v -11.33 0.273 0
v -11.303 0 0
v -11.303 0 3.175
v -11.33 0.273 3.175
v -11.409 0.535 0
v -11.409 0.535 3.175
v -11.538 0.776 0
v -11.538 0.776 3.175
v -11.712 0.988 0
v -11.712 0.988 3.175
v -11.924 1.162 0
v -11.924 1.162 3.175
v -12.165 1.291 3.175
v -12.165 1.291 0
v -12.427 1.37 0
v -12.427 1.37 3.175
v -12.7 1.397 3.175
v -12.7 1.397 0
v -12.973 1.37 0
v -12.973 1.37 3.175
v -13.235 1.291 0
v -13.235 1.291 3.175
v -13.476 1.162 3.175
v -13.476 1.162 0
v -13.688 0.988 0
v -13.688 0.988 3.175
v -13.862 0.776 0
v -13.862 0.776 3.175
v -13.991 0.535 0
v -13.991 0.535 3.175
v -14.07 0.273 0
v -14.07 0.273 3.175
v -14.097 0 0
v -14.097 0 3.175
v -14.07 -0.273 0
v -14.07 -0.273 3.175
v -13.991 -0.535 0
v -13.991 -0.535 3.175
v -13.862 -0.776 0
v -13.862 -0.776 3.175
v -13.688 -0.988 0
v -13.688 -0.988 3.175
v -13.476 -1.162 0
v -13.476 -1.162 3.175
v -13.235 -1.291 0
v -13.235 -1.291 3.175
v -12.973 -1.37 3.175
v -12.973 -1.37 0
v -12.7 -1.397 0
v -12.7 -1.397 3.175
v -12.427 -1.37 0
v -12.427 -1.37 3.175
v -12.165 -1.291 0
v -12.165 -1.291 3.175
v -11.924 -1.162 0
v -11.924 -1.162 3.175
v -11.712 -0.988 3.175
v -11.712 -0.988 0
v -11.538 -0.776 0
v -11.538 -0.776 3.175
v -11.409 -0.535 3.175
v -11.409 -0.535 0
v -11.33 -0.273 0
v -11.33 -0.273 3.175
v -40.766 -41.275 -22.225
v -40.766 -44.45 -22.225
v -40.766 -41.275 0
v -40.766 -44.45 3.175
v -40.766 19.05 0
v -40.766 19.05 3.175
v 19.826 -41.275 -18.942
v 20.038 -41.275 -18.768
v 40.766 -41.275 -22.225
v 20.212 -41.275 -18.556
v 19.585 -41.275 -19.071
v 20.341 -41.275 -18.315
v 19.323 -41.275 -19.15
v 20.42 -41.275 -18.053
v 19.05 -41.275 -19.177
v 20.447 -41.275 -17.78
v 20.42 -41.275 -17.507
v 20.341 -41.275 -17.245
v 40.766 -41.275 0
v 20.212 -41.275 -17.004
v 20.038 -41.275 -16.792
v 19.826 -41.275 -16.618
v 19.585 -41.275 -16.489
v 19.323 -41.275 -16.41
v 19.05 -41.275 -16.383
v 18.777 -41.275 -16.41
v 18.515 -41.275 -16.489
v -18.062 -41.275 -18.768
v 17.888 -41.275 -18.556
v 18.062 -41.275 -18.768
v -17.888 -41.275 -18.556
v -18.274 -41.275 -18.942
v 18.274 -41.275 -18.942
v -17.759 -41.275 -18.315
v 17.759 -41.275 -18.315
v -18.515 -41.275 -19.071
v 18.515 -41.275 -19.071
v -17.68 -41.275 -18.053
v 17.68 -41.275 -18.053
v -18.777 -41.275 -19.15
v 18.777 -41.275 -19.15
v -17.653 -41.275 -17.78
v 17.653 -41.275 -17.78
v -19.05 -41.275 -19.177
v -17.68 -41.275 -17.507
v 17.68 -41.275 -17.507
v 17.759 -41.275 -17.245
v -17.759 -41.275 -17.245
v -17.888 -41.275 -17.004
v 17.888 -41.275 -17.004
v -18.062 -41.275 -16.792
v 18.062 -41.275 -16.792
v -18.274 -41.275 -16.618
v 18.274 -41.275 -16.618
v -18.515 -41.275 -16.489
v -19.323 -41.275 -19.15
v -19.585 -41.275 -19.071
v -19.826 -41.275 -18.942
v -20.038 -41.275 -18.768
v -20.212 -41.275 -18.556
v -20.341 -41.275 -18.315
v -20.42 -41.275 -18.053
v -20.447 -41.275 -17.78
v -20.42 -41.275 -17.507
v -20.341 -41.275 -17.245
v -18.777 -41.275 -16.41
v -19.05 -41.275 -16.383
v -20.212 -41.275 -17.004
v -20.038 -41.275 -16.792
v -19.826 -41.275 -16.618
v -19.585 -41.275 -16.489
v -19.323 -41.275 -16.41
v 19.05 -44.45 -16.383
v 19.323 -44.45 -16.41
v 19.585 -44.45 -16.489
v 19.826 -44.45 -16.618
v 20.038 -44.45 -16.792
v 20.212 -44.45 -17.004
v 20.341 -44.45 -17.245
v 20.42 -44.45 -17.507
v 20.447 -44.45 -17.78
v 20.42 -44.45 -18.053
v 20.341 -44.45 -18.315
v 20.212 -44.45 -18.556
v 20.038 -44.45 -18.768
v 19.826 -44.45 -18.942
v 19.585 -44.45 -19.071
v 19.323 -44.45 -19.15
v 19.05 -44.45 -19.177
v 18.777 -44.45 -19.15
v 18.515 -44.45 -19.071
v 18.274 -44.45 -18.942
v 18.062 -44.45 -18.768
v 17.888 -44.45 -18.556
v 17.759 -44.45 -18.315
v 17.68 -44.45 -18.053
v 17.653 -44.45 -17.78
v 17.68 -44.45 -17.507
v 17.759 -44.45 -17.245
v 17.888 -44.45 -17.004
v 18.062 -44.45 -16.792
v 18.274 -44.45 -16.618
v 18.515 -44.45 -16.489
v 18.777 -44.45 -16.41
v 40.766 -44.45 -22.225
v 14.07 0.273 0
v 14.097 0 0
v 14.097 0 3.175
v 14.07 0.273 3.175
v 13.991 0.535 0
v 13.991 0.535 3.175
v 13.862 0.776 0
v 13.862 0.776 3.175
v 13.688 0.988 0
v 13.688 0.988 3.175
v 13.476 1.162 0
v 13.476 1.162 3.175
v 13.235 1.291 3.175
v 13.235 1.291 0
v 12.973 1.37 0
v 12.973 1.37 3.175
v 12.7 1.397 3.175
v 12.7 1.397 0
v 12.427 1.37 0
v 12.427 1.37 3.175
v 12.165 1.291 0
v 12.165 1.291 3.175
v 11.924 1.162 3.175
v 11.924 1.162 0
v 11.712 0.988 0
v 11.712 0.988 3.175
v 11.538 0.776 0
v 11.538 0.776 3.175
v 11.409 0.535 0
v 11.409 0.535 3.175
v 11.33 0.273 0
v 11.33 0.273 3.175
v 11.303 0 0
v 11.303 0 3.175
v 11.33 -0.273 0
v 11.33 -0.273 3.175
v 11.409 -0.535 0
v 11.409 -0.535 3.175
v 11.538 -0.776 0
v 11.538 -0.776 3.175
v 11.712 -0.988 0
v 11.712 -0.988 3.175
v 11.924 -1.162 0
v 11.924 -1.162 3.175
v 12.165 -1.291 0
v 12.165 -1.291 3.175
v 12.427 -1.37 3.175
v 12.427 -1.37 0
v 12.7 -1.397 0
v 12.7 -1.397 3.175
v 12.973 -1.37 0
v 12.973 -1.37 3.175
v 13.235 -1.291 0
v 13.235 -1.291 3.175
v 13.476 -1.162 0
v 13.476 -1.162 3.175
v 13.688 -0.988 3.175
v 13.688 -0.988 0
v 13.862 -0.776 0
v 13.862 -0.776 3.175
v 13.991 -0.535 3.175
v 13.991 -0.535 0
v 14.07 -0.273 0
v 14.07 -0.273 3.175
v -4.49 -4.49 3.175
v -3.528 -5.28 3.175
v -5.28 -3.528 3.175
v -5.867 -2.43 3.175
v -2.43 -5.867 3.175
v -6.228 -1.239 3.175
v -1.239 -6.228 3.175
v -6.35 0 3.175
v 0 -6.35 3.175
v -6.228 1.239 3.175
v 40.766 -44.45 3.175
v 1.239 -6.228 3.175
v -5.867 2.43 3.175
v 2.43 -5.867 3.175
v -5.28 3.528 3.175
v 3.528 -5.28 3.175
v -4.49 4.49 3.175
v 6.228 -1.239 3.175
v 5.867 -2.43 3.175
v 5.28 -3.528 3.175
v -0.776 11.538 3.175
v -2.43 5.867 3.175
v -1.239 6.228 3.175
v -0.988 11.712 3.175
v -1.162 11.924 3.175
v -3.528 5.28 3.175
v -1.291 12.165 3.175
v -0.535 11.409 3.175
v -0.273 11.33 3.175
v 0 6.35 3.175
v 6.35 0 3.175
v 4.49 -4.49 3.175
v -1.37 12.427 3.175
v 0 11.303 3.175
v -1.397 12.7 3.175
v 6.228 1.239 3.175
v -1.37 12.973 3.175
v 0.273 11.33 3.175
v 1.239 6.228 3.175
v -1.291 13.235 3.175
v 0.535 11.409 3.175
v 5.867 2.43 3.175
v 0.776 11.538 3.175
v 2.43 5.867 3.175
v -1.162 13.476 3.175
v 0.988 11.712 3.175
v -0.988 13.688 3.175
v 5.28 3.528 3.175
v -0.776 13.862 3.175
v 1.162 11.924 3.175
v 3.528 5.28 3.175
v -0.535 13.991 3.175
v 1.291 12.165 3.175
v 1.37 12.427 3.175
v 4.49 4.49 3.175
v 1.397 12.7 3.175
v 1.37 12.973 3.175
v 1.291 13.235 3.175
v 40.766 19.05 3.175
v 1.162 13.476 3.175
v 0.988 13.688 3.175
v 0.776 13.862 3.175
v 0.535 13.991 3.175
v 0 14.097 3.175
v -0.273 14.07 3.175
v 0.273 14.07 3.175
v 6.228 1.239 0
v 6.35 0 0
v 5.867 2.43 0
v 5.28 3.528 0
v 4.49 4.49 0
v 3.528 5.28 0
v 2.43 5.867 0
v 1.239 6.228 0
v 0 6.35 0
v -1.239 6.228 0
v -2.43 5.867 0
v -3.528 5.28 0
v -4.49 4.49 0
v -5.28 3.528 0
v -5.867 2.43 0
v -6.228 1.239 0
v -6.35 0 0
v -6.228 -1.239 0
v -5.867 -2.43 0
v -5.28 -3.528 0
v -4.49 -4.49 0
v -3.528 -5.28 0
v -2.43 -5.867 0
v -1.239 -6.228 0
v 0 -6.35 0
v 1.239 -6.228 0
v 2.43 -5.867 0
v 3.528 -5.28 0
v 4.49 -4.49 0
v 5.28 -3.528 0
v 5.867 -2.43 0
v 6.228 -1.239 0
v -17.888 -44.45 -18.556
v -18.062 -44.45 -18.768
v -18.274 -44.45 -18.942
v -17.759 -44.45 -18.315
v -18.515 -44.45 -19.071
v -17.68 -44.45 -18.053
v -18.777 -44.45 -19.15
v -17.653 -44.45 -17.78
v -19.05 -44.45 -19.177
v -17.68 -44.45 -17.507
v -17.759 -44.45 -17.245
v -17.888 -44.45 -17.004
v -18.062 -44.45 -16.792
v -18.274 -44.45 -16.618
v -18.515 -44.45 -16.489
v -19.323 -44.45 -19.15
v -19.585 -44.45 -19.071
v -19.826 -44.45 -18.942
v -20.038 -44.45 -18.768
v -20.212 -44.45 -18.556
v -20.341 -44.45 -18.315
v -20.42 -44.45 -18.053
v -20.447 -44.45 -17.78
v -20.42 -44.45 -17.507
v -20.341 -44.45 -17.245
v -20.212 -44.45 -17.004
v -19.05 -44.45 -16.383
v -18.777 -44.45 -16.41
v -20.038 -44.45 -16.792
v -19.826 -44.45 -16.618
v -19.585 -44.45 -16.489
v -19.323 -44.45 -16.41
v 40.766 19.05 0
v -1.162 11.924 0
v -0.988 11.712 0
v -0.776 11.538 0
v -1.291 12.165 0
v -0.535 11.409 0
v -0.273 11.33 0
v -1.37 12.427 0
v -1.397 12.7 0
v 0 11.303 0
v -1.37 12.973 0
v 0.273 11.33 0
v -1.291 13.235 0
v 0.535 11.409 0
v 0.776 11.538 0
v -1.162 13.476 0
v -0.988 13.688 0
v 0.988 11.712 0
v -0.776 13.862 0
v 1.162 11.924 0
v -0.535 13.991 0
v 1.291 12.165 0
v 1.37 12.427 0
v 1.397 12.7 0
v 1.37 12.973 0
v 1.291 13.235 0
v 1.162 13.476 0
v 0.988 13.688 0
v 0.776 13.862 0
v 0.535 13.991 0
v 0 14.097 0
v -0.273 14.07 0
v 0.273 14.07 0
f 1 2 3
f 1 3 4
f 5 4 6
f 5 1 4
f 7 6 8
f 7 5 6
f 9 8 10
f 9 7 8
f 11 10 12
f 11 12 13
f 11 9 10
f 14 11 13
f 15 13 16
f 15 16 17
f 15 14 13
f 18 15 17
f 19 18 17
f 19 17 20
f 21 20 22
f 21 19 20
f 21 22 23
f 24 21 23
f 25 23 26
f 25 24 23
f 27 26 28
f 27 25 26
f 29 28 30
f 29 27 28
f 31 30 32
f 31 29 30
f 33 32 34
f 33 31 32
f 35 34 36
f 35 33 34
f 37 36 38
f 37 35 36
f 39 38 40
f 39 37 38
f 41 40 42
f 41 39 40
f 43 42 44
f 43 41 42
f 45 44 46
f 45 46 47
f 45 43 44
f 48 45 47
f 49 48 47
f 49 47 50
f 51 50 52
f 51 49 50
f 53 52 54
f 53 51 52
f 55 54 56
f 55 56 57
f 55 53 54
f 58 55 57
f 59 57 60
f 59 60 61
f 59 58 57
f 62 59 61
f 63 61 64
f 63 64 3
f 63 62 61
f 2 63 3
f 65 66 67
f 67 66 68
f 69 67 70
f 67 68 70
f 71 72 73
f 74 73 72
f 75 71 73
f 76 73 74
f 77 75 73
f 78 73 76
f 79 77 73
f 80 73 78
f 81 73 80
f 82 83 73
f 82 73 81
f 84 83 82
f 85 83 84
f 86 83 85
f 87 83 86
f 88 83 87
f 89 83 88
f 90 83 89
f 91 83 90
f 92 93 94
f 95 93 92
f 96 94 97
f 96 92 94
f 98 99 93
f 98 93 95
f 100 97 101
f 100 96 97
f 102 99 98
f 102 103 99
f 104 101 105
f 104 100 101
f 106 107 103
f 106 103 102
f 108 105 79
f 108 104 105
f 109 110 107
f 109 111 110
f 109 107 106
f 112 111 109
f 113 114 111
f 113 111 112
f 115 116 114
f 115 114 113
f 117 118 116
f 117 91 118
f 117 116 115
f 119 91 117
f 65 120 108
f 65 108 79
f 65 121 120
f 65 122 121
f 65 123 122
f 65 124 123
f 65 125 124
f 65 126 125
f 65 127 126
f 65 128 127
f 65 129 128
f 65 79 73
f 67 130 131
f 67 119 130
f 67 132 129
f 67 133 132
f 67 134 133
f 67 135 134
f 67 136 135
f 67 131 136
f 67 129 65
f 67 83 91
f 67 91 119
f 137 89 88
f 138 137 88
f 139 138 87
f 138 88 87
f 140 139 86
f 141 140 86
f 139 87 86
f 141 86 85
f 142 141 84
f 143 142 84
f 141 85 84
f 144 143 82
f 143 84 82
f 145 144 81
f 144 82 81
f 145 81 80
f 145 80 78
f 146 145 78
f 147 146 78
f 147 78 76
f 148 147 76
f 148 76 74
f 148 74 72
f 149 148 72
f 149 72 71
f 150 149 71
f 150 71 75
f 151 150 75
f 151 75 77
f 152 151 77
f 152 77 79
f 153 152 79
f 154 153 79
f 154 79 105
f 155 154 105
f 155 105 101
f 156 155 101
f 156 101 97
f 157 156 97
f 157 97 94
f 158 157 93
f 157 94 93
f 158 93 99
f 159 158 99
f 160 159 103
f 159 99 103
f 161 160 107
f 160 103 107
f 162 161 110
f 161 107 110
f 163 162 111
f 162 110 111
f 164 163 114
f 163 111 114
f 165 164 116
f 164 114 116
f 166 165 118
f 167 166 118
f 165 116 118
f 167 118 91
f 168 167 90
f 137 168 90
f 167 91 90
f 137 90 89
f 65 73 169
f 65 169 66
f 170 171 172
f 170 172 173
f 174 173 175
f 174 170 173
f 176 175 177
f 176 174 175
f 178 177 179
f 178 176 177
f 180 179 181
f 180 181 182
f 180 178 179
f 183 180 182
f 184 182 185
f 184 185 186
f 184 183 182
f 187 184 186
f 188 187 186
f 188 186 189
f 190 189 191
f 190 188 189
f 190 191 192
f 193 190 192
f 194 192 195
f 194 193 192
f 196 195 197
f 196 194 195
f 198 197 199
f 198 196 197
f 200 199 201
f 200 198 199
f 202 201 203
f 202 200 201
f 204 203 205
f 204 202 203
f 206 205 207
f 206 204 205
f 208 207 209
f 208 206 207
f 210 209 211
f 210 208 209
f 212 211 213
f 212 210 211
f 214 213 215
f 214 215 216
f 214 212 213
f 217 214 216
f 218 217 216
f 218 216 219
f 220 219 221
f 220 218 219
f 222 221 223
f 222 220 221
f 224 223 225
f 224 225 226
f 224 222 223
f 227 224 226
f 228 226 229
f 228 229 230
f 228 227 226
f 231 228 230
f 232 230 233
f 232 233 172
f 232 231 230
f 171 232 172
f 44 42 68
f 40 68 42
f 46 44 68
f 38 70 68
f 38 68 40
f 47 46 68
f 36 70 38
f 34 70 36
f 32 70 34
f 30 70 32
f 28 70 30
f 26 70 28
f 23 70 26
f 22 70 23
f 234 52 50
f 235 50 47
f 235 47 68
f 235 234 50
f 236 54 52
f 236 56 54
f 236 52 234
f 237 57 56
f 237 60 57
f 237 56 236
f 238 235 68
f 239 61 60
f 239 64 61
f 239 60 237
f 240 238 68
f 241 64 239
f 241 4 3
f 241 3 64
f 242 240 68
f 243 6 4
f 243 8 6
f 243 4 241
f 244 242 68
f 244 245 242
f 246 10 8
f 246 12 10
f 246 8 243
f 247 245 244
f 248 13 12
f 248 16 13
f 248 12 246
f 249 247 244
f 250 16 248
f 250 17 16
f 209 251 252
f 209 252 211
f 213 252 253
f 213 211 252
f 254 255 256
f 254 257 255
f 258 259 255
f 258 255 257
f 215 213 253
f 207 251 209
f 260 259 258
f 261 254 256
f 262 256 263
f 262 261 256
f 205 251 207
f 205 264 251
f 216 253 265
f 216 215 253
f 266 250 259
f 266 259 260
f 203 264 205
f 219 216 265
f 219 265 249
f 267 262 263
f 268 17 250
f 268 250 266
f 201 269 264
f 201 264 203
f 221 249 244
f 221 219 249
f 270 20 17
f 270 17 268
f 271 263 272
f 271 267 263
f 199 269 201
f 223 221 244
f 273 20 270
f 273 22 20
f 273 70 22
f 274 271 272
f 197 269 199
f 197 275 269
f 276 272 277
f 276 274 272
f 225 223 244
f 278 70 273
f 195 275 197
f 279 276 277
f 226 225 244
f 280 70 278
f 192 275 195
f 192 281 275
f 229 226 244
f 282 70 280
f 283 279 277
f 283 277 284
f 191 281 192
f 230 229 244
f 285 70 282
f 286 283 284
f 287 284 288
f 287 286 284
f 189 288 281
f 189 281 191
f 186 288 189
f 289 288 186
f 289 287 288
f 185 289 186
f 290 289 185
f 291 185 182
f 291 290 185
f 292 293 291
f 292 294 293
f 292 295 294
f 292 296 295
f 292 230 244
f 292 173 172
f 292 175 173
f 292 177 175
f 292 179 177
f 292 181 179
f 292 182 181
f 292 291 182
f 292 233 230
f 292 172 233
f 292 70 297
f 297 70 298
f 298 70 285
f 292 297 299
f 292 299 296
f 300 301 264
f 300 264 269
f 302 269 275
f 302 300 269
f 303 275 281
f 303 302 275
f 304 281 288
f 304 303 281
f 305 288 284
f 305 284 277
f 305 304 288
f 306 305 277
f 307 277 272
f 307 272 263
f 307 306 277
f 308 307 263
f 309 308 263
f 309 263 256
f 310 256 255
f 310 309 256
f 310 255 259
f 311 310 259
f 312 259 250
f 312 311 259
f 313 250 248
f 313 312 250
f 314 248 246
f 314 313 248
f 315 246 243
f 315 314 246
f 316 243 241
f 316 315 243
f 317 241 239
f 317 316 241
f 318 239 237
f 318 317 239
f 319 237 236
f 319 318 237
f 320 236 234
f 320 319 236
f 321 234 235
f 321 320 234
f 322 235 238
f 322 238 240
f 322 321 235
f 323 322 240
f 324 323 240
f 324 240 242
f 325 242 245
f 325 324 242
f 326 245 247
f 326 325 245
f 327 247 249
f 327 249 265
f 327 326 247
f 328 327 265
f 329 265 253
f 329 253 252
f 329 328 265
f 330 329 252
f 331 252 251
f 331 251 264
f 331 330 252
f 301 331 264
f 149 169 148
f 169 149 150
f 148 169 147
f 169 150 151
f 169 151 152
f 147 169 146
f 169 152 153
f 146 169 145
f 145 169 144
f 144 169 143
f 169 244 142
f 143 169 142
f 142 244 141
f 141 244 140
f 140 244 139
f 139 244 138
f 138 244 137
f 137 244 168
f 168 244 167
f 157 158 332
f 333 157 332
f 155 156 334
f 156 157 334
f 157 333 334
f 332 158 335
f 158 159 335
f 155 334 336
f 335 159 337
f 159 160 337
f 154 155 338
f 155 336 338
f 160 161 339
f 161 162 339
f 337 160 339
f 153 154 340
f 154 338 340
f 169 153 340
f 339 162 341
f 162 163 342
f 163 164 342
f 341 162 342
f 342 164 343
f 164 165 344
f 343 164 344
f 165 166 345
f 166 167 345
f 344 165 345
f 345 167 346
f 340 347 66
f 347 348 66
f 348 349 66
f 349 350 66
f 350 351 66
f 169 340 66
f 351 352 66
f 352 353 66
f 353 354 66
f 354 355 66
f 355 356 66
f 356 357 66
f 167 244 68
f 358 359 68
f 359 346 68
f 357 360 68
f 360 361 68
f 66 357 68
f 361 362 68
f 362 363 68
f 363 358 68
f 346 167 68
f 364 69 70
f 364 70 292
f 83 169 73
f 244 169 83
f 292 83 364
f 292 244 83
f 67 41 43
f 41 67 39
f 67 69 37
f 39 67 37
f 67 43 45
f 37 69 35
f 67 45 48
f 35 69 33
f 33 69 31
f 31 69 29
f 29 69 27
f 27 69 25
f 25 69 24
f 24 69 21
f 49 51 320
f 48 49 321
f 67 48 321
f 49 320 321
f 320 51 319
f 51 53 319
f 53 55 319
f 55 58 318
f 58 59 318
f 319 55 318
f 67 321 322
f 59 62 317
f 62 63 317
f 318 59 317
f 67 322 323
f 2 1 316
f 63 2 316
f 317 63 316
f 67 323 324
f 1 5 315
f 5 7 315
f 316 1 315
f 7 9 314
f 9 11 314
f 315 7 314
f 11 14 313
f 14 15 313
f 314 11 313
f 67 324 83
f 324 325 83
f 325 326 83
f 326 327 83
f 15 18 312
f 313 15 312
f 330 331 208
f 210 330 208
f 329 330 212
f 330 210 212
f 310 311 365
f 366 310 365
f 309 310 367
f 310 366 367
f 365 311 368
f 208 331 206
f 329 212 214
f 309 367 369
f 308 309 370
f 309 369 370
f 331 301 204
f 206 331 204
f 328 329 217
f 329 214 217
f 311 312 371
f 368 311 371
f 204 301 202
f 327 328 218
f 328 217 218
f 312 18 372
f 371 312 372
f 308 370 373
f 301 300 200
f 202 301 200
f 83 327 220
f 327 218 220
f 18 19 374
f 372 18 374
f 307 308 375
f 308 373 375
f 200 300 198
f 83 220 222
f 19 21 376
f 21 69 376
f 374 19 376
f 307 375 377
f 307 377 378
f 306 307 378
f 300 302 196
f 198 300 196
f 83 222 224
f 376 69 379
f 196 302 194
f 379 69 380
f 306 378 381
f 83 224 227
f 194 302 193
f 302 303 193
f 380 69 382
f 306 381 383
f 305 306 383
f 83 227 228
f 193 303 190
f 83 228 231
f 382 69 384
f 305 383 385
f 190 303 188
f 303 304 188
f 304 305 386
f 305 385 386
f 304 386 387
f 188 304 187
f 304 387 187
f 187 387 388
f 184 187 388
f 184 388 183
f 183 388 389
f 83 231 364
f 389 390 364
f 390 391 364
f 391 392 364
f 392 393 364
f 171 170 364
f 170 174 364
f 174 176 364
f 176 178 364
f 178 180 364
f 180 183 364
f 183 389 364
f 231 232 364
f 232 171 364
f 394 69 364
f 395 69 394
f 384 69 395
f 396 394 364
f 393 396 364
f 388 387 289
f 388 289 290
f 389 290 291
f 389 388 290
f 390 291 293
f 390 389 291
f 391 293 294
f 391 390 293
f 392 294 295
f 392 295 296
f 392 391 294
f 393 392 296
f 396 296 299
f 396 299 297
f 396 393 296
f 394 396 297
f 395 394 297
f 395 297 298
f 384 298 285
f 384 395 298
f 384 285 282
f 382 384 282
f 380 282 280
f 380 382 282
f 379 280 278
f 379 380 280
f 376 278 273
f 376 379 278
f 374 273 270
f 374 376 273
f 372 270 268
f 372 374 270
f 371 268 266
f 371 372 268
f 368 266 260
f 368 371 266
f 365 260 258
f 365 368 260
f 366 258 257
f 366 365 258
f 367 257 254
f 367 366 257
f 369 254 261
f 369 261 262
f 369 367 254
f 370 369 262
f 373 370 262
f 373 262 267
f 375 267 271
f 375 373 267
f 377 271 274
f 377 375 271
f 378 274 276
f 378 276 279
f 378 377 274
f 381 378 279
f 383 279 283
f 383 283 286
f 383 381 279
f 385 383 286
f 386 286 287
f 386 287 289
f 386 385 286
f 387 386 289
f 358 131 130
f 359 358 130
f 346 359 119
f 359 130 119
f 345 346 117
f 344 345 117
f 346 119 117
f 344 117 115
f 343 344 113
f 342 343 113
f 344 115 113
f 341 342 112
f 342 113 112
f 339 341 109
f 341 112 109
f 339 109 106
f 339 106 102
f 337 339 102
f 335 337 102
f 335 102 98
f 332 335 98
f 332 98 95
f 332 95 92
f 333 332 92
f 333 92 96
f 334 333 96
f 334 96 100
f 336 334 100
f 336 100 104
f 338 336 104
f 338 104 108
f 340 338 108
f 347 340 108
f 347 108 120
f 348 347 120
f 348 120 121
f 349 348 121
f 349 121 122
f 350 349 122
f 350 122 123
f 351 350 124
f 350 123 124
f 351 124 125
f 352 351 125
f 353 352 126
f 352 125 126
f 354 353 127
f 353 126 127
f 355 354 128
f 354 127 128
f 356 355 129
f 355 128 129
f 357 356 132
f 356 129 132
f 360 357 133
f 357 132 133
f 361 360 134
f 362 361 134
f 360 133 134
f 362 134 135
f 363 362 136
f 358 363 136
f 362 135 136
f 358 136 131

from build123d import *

# Parameters (mm, degrees)
SKETCH1_W           = 81.531554226
SKETCH1_H           = 63.5
SKETCH1_R           = 6.35
SKETCH1_R_2         = 1.397
BOSS_EXTRUDE1_DEPTH = 3.175
SKETCH2_W           = 81.531554226
SKETCH2_H           = 3.175
BOSS_EXTRUDE2_DEPTH = 22.225
SKETCH3_R           = 1.397
CUT_EXTRUDE1_DEPTH  = 3175


with BuildPart() as part:
    # Sketch1 → Boss-Extrude1 (new body)
    with BuildSketch(Plane.XY):
        with Locations((0, -12.7)):
            Rectangle(SKETCH1_W, SKETCH1_H)
        Circle(SKETCH1_R, mode=Mode.SUBTRACT)
        with Locations((0, 12.7)):
            Circle(SKETCH1_R_2, mode=Mode.SUBTRACT)
        with Locations((-12.7, 0)):
            Circle(SKETCH1_R_2, mode=Mode.SUBTRACT)
        with Locations((12.7, 0)):
            Circle(SKETCH1_R_2, mode=Mode.SUBTRACT)
    extrude(amount=BOSS_EXTRUDE1_DEPTH)

    # Sketch2 → Boss-Extrude2 (add)
    with BuildSketch(Plane(origin=(0, 0, 0), x_dir=(-1, 0, 0), z_dir=(0, 0, -1))):
        with Locations((0, -42.8625)):
            Rectangle(SKETCH2_W, SKETCH2_H)
    extrude(amount=BOSS_EXTRUDE2_DEPTH)

    # Sketch3 → Cut-Extrude1 (cut)
    with BuildSketch(Plane(origin=(0, -41.275, 0), x_dir=(1, 0, 0), z_dir=(0, 1, 0))):
        with Locations(Location((-19.05, 17.78, 0), (0, 0, 270))):
            Circle(SKETCH3_R)
        with Locations(Location((19.05, 17.78, 0), (0, 0, 270))):
            Circle(SKETCH3_R)
    extrude(amount=-CUT_EXTRUDE1_DEPTH, mode=Mode.SUBTRACT)


solid = part.part
